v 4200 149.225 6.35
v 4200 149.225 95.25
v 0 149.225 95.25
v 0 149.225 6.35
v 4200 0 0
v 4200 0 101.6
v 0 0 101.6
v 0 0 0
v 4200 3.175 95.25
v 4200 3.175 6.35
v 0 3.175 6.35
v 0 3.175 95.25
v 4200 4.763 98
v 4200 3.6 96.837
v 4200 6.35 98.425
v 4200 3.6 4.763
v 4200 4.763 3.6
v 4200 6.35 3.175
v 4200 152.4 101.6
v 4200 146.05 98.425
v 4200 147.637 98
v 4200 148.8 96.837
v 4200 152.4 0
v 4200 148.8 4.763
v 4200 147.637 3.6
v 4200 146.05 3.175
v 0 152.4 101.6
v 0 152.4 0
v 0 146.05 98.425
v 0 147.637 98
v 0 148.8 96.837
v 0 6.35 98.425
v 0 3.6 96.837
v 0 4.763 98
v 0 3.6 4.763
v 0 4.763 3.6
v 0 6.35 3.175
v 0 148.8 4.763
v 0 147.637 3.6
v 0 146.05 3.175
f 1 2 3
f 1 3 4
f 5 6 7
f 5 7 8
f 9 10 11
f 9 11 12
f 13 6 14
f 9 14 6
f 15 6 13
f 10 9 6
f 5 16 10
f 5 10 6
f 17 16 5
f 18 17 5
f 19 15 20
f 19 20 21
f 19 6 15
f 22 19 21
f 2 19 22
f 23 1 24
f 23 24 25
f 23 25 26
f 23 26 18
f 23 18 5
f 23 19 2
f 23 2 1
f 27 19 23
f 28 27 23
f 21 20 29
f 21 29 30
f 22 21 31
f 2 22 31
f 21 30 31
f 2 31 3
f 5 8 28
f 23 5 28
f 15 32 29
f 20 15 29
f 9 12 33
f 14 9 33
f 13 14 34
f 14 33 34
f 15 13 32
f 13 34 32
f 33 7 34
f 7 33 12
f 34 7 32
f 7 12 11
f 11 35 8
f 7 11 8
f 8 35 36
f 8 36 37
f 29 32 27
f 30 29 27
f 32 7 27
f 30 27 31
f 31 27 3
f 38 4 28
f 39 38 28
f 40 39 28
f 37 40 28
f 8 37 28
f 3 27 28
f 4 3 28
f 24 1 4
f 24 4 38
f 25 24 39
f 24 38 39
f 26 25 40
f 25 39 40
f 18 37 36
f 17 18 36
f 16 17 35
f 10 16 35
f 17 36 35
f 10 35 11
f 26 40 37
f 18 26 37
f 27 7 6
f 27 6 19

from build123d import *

# Parameters (mm, degrees)
SKETCH1_W           = 101.6
SKETCH1_H           = 152.4
BOSS_EXTRUDE1_DEPTH = 4200


with BuildPart() as part:
    # Sketch1 → Boss-Extrude1 (new body)
    with BuildSketch(Plane(origin=(0, 0, 0), x_dir=(0, 0, -1), z_dir=(1, 0, 0))):
        with Locations((-50.8, 76.2)):
            Rectangle(SKETCH1_W, SKETCH1_H)
        with BuildLine():
            Line((-98.425, 6.35), (-98.425, 146.05))
            ThreePointArc((-98.425, 146.05), (-97.49506403, 148.29506403), (-95.25, 149.225))
            Line((-95.25, 149.225), (-6.35, 149.225))
            ThreePointArc((-6.35, 149.225), (-4.10493597, 148.29506403), (-3.175, 146.05))
            Line((-3.175, 146.05), (-3.175, 6.35))
            ThreePointArc((-3.175, 6.35), (-4.10493597, 4.10493597), (-6.35, 3.175))
            Line((-6.35, 3.175), (-95.25, 3.175))
            ThreePointArc((-95.25, 3.175), (-97.49506403, 4.10493597), (-98.425, 6.35))
        make_face(mode=Mode.SUBTRACT)
    extrude(amount=BOSS_EXTRUDE1_DEPTH)


solid = part.part
